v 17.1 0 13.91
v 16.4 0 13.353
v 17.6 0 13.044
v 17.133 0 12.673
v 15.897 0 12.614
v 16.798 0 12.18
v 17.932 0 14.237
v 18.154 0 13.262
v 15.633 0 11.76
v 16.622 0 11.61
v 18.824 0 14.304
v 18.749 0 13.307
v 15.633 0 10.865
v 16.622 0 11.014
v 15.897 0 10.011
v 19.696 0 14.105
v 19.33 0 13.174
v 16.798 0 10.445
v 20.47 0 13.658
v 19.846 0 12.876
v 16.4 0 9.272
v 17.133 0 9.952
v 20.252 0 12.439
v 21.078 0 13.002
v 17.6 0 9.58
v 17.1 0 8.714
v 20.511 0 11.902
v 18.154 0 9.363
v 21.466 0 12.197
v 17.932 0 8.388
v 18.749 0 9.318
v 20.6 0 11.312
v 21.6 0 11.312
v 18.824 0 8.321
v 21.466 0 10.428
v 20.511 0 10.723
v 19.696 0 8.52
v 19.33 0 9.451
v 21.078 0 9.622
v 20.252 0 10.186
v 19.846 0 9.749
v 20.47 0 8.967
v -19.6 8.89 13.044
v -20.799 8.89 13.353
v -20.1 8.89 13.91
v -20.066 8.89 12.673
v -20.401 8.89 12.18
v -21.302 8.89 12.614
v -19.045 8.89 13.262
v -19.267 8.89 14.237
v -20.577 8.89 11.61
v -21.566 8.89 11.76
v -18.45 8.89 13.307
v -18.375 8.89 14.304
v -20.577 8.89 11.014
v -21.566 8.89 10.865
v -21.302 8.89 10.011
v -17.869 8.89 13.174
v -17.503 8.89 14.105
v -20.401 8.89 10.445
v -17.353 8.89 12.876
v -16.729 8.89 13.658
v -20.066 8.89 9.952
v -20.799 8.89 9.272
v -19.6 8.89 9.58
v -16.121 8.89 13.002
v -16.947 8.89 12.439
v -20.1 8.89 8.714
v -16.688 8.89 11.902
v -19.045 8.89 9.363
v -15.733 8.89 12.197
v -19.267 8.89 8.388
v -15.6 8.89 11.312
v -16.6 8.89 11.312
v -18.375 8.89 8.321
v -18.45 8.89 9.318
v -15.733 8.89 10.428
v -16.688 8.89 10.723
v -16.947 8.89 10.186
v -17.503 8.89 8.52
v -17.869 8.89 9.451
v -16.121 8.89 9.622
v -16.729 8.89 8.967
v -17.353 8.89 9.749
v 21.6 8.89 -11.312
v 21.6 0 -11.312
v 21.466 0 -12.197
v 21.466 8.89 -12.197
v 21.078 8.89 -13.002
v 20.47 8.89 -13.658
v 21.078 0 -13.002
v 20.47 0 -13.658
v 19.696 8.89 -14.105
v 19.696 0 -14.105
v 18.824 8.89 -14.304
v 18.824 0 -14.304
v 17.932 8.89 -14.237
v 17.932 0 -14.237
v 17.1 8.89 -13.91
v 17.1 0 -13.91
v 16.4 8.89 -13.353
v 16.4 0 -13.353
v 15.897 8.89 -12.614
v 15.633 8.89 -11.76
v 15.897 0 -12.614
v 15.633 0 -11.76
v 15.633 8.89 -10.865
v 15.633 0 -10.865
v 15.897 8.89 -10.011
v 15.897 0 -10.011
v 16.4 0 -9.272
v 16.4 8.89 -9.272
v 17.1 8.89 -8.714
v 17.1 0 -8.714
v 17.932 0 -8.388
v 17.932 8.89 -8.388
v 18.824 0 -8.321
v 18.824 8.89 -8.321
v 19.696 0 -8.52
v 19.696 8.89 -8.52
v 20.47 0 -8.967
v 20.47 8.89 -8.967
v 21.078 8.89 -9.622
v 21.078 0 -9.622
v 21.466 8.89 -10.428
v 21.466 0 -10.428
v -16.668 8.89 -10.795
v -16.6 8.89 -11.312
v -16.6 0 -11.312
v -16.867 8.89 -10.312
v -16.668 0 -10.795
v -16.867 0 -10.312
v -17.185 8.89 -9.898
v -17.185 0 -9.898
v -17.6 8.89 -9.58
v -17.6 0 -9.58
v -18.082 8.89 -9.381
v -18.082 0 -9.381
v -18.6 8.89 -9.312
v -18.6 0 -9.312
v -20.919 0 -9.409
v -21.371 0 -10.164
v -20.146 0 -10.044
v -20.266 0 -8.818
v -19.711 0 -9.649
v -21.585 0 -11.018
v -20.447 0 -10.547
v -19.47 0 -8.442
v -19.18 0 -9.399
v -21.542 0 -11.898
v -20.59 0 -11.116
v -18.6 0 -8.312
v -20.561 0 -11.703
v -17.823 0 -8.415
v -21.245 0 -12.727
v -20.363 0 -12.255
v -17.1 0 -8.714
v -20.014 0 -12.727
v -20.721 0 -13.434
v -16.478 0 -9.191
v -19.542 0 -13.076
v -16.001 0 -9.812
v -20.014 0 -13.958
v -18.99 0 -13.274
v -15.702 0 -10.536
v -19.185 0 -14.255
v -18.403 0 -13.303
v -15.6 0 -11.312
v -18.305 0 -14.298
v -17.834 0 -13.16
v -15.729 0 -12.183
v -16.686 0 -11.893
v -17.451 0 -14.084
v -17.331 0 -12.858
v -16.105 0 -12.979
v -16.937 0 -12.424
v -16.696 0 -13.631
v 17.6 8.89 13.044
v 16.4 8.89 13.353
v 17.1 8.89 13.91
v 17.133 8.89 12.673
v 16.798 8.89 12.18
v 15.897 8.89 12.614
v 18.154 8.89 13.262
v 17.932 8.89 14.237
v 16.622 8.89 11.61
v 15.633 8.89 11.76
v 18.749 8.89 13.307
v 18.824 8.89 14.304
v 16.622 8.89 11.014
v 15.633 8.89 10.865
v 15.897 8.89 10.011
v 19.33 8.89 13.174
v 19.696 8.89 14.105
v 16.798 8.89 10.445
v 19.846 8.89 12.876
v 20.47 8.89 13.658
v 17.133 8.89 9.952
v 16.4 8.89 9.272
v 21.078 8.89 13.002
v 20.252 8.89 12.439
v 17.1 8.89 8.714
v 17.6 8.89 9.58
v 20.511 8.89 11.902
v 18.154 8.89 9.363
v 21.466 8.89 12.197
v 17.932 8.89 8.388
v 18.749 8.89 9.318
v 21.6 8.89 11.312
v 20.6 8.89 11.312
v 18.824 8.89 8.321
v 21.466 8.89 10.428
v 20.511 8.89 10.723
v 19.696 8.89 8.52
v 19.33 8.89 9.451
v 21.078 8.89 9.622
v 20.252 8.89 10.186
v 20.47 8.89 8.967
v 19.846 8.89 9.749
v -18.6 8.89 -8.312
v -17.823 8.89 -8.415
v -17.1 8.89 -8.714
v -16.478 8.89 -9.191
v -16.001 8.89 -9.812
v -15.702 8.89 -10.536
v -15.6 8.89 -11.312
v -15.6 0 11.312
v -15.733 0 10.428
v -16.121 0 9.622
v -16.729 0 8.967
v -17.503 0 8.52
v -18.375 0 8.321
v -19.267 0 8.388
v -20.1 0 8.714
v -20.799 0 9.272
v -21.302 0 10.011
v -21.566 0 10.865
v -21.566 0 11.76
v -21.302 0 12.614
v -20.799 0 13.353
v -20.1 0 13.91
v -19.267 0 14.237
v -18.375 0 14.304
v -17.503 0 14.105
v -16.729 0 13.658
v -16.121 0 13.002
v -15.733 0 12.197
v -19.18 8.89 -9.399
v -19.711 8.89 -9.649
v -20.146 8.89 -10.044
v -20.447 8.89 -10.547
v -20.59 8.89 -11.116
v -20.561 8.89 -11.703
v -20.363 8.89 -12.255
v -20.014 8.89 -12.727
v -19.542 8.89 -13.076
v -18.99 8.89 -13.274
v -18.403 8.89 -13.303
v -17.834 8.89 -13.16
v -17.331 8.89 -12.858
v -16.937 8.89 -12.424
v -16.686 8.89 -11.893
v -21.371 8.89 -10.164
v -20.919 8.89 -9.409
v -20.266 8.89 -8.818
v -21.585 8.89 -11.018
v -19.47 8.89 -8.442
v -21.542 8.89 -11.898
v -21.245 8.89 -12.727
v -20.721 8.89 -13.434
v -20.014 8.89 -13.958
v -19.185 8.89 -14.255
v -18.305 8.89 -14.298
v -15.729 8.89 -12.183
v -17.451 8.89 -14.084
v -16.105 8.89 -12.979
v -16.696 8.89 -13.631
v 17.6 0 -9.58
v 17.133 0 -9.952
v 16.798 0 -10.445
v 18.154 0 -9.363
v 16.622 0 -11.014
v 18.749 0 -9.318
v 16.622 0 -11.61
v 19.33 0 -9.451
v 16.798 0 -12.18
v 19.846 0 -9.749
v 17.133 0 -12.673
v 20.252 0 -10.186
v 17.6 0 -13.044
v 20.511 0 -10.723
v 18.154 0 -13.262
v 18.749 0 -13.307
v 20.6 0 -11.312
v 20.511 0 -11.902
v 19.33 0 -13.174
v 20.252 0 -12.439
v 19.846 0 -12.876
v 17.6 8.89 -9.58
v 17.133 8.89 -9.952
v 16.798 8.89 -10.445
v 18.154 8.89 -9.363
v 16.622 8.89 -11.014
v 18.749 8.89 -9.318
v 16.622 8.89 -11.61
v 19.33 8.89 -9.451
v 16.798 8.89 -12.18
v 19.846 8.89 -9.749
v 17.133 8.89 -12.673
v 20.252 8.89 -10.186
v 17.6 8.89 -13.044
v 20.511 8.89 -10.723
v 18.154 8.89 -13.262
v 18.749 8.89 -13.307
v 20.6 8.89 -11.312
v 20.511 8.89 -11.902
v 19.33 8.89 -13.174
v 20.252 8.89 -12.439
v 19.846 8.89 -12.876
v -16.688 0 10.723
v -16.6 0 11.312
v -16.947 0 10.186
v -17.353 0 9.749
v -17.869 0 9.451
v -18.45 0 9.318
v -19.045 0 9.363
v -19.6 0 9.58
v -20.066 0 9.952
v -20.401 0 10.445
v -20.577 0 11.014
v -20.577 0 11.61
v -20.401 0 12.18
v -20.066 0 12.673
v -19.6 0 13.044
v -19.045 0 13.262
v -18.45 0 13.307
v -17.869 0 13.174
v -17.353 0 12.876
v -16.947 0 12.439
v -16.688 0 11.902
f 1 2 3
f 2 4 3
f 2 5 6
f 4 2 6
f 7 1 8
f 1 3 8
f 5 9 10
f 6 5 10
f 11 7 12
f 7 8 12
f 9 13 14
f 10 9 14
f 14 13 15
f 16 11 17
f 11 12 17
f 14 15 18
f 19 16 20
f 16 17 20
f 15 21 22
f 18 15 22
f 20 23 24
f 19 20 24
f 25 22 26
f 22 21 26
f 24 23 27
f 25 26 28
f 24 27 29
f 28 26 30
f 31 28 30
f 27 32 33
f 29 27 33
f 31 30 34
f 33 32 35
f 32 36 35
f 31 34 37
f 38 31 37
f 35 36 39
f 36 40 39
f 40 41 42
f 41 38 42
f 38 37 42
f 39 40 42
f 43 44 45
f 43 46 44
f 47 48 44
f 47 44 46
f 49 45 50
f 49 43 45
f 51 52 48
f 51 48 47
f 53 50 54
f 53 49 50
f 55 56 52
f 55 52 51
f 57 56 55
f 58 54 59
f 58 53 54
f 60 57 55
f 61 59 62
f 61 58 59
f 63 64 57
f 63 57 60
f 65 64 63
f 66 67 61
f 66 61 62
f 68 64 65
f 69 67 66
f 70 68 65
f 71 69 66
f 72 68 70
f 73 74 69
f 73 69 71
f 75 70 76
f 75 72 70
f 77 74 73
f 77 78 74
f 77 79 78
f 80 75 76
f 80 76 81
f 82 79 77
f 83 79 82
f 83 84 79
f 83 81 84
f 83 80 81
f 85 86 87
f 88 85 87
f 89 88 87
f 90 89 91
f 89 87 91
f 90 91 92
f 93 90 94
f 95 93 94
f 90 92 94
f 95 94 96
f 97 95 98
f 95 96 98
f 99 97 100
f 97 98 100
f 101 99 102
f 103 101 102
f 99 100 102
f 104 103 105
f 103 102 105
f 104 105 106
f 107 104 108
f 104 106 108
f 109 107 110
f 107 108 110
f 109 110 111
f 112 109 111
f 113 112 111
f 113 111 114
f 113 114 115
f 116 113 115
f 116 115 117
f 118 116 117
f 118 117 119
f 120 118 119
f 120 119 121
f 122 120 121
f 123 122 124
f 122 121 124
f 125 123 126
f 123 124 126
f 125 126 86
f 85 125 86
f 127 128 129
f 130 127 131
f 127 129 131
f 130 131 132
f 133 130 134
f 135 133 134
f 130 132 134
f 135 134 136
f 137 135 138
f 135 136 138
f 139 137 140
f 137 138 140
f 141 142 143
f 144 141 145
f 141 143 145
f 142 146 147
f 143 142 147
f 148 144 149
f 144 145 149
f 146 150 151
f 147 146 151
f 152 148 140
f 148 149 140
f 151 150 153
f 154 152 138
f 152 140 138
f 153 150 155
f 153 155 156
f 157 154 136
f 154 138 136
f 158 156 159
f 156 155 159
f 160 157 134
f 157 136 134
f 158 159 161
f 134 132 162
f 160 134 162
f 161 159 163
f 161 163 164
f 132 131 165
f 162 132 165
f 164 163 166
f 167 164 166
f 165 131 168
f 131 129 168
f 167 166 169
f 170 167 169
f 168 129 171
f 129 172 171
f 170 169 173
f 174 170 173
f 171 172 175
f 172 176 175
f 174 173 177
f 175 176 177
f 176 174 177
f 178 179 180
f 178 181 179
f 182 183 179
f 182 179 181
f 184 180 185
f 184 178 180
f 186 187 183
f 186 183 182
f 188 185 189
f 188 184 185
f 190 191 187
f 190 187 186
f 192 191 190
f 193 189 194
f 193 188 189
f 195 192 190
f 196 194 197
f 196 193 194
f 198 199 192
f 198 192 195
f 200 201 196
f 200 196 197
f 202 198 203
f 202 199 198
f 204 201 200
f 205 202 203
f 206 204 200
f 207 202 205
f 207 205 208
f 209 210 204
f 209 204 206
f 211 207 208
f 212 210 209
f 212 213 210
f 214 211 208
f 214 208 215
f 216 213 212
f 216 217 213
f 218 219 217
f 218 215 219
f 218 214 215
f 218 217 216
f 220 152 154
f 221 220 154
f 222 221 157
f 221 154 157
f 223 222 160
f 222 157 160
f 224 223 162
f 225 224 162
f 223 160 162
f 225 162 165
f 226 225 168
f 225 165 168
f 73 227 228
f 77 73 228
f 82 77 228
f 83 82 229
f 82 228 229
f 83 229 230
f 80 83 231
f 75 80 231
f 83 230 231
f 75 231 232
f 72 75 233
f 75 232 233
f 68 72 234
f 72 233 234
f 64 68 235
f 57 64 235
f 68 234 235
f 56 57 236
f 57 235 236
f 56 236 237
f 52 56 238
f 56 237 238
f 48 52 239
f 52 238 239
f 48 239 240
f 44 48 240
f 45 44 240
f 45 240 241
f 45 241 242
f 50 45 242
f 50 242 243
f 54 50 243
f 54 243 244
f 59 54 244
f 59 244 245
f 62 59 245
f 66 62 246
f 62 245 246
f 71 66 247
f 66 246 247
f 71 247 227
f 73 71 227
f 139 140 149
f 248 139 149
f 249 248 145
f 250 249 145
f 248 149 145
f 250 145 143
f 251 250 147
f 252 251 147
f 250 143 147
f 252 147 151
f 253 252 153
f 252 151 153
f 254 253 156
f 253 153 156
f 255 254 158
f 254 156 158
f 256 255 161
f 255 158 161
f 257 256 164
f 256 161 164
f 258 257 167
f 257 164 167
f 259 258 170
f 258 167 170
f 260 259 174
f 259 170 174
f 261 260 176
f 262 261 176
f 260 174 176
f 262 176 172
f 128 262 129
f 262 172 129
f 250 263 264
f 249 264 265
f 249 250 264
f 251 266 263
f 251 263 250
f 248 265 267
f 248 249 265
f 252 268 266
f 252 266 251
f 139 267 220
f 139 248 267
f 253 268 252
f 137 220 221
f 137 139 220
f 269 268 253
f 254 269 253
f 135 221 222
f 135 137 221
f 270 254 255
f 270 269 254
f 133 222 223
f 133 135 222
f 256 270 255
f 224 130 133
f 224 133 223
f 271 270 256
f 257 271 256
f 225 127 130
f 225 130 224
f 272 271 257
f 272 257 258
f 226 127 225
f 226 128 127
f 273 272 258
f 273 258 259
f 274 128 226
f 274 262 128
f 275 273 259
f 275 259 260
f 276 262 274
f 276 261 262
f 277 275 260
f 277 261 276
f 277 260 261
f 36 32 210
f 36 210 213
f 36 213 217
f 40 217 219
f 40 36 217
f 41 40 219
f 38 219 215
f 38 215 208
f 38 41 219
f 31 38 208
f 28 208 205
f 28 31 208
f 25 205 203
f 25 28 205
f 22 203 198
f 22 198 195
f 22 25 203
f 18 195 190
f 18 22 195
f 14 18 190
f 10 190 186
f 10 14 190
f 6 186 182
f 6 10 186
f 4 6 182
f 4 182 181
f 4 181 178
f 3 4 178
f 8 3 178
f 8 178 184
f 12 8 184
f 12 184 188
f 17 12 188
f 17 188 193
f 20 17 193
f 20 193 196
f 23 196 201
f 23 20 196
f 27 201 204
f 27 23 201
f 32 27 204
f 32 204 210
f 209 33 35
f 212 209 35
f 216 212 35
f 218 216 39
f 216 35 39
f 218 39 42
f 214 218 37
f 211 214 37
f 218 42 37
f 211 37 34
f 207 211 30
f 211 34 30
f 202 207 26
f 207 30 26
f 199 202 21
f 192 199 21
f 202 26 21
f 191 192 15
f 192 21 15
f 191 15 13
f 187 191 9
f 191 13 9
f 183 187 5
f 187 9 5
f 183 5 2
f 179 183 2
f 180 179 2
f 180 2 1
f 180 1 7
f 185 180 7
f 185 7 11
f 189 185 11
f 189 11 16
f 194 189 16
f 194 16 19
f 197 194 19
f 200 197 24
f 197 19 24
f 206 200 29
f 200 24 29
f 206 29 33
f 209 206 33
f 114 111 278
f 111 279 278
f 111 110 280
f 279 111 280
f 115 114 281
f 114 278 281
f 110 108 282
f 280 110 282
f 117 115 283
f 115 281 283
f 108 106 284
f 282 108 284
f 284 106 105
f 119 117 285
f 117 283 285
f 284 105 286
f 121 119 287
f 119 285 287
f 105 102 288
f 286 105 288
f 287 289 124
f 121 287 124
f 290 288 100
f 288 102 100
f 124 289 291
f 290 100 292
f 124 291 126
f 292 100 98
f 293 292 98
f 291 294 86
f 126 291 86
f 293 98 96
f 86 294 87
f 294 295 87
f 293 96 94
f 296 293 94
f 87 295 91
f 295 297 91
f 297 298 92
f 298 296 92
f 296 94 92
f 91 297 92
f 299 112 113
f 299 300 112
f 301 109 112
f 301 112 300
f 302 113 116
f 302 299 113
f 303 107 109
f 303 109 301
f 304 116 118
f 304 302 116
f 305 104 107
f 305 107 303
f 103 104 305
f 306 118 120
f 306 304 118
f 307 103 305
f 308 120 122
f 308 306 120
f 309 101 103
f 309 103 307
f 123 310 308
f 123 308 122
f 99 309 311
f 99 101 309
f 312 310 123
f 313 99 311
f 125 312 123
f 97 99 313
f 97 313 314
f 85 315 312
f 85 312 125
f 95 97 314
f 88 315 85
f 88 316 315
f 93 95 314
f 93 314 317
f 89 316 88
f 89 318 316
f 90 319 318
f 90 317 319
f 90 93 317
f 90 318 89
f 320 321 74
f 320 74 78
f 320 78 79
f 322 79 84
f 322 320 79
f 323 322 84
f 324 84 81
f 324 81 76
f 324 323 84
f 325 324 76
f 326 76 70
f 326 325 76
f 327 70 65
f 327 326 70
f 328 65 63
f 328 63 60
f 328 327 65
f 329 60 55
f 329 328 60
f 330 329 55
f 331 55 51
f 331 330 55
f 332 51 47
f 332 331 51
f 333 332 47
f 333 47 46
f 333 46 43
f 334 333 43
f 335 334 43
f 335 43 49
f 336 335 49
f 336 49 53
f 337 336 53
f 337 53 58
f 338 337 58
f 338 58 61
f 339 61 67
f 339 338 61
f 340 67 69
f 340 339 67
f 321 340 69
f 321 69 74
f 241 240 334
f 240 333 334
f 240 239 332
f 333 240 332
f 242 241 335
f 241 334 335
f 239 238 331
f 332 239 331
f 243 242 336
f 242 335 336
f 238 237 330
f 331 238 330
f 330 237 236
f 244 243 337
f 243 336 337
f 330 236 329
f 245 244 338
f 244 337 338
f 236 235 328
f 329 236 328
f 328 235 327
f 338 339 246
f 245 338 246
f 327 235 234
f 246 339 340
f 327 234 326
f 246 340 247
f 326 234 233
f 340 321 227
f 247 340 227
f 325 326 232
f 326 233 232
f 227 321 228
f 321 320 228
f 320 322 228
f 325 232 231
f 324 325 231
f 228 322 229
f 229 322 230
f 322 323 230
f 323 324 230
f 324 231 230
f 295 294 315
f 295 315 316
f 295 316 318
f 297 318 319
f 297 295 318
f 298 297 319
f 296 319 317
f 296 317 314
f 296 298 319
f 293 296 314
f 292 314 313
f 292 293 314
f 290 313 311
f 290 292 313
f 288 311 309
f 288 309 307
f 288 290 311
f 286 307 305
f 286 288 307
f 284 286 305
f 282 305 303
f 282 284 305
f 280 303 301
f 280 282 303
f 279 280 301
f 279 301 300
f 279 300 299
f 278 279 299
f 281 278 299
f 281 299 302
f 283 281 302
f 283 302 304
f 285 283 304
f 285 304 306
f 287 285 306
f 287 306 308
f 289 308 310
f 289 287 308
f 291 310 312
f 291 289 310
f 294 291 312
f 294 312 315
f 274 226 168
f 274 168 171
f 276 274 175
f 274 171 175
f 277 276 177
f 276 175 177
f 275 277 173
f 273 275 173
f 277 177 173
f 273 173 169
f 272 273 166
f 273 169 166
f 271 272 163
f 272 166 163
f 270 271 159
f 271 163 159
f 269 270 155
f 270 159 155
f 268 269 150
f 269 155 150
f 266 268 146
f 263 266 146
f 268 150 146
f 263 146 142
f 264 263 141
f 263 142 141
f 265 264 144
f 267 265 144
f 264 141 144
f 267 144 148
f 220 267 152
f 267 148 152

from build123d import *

# Parameters (mm, degrees)
BOSS_EXTRUDE2_DEPTH = 8.89
MIRROR4_OUTLINE_R   = 3
MIRROR4_OUTLINE_R_2 = 2
MIRROR4_DEPTH       = 8.89


# Read off the part's stored shape, not the designer's step: Mirror4
with BuildPart() as part:
    # Sketch1 → Boss-Extrude2 (new body)
    with BuildSketch(Plane(origin=(0, 0, 0), x_dir=(1, 0, 0), z_dir=(0, 1, 0))):
        with BuildLine():
            ThreePointArc((-18.599507831, 9.312387225), (-20.013721393, 12.726600788), (-16.599507831, 11.312387225))
            Line((-16.599507831, 11.312387225), (-15.599507831, 11.312387225))
            ThreePointArc((-15.599507831, 11.312387225), (-20.720828174, 13.433707569), (-18.599507831, 8.312387225))
            Line((-18.599507831, 8.312387225), (-18.599507831, 9.312387225))
        make_face()
        with BuildLine():
            Line((-15.599507831, 11.312387225), (-16.599507831, 11.312387225))
            ThreePointArc((-16.599507831, 11.312387225), (-17.185294268, 9.898173663), (-18.599507831, 9.312387225))
            Line((-18.599507831, 9.312387225), (-18.599507831, 8.312387225))
            ThreePointArc((-18.599507831, 8.312387225), (-16.478187487, 9.191066882), (-15.599507831, 11.312387225))
        make_face()
    extrude(amount=BOSS_EXTRUDE2_DEPTH)


with BuildPart() as body_2:
    # Mirror4 outline → Mirror4 (new body)
    # profile 1 of 3: a face of its own
    with BuildSketch(Plane(origin=(0, 0, 0), x_dir=(1, 0, 0), z_dir=(0, 1, 0))):
        with Locations((18.599507831, -11.312387225)):
            Circle(MIRROR4_OUTLINE_R)
        with Locations((18.599507831, -11.312387225)):
            Circle(MIRROR4_OUTLINE_R_2, mode=Mode.SUBTRACT)
    # profile 2 of 3: a face of its own
    with BuildSketch(Plane(origin=(0, 0, 0), x_dir=(1, 0, 0), z_dir=(0, 1, 0))):
        with Locations((18.599507831, 11.312387225)):
            Circle(MIRROR4_OUTLINE_R)
        with Locations((18.599507831, 11.312387225)):
            Circle(MIRROR4_OUTLINE_R_2, mode=Mode.SUBTRACT)
    # profile 3 of 3: a face of its own
    with BuildSketch(Plane(origin=(0, 0, 0), x_dir=(1, 0, 0), z_dir=(0, 1, 0))):
        with Locations((-18.599507831, -11.312387225)):
            Circle(MIRROR4_OUTLINE_R)
        with Locations((-18.599507831, -11.312387225)):
            Circle(MIRROR4_OUTLINE_R_2, mode=Mode.SUBTRACT)
    extrude(amount=MIRROR4_DEPTH)


solid = Compound([part.part, body_2.part])
